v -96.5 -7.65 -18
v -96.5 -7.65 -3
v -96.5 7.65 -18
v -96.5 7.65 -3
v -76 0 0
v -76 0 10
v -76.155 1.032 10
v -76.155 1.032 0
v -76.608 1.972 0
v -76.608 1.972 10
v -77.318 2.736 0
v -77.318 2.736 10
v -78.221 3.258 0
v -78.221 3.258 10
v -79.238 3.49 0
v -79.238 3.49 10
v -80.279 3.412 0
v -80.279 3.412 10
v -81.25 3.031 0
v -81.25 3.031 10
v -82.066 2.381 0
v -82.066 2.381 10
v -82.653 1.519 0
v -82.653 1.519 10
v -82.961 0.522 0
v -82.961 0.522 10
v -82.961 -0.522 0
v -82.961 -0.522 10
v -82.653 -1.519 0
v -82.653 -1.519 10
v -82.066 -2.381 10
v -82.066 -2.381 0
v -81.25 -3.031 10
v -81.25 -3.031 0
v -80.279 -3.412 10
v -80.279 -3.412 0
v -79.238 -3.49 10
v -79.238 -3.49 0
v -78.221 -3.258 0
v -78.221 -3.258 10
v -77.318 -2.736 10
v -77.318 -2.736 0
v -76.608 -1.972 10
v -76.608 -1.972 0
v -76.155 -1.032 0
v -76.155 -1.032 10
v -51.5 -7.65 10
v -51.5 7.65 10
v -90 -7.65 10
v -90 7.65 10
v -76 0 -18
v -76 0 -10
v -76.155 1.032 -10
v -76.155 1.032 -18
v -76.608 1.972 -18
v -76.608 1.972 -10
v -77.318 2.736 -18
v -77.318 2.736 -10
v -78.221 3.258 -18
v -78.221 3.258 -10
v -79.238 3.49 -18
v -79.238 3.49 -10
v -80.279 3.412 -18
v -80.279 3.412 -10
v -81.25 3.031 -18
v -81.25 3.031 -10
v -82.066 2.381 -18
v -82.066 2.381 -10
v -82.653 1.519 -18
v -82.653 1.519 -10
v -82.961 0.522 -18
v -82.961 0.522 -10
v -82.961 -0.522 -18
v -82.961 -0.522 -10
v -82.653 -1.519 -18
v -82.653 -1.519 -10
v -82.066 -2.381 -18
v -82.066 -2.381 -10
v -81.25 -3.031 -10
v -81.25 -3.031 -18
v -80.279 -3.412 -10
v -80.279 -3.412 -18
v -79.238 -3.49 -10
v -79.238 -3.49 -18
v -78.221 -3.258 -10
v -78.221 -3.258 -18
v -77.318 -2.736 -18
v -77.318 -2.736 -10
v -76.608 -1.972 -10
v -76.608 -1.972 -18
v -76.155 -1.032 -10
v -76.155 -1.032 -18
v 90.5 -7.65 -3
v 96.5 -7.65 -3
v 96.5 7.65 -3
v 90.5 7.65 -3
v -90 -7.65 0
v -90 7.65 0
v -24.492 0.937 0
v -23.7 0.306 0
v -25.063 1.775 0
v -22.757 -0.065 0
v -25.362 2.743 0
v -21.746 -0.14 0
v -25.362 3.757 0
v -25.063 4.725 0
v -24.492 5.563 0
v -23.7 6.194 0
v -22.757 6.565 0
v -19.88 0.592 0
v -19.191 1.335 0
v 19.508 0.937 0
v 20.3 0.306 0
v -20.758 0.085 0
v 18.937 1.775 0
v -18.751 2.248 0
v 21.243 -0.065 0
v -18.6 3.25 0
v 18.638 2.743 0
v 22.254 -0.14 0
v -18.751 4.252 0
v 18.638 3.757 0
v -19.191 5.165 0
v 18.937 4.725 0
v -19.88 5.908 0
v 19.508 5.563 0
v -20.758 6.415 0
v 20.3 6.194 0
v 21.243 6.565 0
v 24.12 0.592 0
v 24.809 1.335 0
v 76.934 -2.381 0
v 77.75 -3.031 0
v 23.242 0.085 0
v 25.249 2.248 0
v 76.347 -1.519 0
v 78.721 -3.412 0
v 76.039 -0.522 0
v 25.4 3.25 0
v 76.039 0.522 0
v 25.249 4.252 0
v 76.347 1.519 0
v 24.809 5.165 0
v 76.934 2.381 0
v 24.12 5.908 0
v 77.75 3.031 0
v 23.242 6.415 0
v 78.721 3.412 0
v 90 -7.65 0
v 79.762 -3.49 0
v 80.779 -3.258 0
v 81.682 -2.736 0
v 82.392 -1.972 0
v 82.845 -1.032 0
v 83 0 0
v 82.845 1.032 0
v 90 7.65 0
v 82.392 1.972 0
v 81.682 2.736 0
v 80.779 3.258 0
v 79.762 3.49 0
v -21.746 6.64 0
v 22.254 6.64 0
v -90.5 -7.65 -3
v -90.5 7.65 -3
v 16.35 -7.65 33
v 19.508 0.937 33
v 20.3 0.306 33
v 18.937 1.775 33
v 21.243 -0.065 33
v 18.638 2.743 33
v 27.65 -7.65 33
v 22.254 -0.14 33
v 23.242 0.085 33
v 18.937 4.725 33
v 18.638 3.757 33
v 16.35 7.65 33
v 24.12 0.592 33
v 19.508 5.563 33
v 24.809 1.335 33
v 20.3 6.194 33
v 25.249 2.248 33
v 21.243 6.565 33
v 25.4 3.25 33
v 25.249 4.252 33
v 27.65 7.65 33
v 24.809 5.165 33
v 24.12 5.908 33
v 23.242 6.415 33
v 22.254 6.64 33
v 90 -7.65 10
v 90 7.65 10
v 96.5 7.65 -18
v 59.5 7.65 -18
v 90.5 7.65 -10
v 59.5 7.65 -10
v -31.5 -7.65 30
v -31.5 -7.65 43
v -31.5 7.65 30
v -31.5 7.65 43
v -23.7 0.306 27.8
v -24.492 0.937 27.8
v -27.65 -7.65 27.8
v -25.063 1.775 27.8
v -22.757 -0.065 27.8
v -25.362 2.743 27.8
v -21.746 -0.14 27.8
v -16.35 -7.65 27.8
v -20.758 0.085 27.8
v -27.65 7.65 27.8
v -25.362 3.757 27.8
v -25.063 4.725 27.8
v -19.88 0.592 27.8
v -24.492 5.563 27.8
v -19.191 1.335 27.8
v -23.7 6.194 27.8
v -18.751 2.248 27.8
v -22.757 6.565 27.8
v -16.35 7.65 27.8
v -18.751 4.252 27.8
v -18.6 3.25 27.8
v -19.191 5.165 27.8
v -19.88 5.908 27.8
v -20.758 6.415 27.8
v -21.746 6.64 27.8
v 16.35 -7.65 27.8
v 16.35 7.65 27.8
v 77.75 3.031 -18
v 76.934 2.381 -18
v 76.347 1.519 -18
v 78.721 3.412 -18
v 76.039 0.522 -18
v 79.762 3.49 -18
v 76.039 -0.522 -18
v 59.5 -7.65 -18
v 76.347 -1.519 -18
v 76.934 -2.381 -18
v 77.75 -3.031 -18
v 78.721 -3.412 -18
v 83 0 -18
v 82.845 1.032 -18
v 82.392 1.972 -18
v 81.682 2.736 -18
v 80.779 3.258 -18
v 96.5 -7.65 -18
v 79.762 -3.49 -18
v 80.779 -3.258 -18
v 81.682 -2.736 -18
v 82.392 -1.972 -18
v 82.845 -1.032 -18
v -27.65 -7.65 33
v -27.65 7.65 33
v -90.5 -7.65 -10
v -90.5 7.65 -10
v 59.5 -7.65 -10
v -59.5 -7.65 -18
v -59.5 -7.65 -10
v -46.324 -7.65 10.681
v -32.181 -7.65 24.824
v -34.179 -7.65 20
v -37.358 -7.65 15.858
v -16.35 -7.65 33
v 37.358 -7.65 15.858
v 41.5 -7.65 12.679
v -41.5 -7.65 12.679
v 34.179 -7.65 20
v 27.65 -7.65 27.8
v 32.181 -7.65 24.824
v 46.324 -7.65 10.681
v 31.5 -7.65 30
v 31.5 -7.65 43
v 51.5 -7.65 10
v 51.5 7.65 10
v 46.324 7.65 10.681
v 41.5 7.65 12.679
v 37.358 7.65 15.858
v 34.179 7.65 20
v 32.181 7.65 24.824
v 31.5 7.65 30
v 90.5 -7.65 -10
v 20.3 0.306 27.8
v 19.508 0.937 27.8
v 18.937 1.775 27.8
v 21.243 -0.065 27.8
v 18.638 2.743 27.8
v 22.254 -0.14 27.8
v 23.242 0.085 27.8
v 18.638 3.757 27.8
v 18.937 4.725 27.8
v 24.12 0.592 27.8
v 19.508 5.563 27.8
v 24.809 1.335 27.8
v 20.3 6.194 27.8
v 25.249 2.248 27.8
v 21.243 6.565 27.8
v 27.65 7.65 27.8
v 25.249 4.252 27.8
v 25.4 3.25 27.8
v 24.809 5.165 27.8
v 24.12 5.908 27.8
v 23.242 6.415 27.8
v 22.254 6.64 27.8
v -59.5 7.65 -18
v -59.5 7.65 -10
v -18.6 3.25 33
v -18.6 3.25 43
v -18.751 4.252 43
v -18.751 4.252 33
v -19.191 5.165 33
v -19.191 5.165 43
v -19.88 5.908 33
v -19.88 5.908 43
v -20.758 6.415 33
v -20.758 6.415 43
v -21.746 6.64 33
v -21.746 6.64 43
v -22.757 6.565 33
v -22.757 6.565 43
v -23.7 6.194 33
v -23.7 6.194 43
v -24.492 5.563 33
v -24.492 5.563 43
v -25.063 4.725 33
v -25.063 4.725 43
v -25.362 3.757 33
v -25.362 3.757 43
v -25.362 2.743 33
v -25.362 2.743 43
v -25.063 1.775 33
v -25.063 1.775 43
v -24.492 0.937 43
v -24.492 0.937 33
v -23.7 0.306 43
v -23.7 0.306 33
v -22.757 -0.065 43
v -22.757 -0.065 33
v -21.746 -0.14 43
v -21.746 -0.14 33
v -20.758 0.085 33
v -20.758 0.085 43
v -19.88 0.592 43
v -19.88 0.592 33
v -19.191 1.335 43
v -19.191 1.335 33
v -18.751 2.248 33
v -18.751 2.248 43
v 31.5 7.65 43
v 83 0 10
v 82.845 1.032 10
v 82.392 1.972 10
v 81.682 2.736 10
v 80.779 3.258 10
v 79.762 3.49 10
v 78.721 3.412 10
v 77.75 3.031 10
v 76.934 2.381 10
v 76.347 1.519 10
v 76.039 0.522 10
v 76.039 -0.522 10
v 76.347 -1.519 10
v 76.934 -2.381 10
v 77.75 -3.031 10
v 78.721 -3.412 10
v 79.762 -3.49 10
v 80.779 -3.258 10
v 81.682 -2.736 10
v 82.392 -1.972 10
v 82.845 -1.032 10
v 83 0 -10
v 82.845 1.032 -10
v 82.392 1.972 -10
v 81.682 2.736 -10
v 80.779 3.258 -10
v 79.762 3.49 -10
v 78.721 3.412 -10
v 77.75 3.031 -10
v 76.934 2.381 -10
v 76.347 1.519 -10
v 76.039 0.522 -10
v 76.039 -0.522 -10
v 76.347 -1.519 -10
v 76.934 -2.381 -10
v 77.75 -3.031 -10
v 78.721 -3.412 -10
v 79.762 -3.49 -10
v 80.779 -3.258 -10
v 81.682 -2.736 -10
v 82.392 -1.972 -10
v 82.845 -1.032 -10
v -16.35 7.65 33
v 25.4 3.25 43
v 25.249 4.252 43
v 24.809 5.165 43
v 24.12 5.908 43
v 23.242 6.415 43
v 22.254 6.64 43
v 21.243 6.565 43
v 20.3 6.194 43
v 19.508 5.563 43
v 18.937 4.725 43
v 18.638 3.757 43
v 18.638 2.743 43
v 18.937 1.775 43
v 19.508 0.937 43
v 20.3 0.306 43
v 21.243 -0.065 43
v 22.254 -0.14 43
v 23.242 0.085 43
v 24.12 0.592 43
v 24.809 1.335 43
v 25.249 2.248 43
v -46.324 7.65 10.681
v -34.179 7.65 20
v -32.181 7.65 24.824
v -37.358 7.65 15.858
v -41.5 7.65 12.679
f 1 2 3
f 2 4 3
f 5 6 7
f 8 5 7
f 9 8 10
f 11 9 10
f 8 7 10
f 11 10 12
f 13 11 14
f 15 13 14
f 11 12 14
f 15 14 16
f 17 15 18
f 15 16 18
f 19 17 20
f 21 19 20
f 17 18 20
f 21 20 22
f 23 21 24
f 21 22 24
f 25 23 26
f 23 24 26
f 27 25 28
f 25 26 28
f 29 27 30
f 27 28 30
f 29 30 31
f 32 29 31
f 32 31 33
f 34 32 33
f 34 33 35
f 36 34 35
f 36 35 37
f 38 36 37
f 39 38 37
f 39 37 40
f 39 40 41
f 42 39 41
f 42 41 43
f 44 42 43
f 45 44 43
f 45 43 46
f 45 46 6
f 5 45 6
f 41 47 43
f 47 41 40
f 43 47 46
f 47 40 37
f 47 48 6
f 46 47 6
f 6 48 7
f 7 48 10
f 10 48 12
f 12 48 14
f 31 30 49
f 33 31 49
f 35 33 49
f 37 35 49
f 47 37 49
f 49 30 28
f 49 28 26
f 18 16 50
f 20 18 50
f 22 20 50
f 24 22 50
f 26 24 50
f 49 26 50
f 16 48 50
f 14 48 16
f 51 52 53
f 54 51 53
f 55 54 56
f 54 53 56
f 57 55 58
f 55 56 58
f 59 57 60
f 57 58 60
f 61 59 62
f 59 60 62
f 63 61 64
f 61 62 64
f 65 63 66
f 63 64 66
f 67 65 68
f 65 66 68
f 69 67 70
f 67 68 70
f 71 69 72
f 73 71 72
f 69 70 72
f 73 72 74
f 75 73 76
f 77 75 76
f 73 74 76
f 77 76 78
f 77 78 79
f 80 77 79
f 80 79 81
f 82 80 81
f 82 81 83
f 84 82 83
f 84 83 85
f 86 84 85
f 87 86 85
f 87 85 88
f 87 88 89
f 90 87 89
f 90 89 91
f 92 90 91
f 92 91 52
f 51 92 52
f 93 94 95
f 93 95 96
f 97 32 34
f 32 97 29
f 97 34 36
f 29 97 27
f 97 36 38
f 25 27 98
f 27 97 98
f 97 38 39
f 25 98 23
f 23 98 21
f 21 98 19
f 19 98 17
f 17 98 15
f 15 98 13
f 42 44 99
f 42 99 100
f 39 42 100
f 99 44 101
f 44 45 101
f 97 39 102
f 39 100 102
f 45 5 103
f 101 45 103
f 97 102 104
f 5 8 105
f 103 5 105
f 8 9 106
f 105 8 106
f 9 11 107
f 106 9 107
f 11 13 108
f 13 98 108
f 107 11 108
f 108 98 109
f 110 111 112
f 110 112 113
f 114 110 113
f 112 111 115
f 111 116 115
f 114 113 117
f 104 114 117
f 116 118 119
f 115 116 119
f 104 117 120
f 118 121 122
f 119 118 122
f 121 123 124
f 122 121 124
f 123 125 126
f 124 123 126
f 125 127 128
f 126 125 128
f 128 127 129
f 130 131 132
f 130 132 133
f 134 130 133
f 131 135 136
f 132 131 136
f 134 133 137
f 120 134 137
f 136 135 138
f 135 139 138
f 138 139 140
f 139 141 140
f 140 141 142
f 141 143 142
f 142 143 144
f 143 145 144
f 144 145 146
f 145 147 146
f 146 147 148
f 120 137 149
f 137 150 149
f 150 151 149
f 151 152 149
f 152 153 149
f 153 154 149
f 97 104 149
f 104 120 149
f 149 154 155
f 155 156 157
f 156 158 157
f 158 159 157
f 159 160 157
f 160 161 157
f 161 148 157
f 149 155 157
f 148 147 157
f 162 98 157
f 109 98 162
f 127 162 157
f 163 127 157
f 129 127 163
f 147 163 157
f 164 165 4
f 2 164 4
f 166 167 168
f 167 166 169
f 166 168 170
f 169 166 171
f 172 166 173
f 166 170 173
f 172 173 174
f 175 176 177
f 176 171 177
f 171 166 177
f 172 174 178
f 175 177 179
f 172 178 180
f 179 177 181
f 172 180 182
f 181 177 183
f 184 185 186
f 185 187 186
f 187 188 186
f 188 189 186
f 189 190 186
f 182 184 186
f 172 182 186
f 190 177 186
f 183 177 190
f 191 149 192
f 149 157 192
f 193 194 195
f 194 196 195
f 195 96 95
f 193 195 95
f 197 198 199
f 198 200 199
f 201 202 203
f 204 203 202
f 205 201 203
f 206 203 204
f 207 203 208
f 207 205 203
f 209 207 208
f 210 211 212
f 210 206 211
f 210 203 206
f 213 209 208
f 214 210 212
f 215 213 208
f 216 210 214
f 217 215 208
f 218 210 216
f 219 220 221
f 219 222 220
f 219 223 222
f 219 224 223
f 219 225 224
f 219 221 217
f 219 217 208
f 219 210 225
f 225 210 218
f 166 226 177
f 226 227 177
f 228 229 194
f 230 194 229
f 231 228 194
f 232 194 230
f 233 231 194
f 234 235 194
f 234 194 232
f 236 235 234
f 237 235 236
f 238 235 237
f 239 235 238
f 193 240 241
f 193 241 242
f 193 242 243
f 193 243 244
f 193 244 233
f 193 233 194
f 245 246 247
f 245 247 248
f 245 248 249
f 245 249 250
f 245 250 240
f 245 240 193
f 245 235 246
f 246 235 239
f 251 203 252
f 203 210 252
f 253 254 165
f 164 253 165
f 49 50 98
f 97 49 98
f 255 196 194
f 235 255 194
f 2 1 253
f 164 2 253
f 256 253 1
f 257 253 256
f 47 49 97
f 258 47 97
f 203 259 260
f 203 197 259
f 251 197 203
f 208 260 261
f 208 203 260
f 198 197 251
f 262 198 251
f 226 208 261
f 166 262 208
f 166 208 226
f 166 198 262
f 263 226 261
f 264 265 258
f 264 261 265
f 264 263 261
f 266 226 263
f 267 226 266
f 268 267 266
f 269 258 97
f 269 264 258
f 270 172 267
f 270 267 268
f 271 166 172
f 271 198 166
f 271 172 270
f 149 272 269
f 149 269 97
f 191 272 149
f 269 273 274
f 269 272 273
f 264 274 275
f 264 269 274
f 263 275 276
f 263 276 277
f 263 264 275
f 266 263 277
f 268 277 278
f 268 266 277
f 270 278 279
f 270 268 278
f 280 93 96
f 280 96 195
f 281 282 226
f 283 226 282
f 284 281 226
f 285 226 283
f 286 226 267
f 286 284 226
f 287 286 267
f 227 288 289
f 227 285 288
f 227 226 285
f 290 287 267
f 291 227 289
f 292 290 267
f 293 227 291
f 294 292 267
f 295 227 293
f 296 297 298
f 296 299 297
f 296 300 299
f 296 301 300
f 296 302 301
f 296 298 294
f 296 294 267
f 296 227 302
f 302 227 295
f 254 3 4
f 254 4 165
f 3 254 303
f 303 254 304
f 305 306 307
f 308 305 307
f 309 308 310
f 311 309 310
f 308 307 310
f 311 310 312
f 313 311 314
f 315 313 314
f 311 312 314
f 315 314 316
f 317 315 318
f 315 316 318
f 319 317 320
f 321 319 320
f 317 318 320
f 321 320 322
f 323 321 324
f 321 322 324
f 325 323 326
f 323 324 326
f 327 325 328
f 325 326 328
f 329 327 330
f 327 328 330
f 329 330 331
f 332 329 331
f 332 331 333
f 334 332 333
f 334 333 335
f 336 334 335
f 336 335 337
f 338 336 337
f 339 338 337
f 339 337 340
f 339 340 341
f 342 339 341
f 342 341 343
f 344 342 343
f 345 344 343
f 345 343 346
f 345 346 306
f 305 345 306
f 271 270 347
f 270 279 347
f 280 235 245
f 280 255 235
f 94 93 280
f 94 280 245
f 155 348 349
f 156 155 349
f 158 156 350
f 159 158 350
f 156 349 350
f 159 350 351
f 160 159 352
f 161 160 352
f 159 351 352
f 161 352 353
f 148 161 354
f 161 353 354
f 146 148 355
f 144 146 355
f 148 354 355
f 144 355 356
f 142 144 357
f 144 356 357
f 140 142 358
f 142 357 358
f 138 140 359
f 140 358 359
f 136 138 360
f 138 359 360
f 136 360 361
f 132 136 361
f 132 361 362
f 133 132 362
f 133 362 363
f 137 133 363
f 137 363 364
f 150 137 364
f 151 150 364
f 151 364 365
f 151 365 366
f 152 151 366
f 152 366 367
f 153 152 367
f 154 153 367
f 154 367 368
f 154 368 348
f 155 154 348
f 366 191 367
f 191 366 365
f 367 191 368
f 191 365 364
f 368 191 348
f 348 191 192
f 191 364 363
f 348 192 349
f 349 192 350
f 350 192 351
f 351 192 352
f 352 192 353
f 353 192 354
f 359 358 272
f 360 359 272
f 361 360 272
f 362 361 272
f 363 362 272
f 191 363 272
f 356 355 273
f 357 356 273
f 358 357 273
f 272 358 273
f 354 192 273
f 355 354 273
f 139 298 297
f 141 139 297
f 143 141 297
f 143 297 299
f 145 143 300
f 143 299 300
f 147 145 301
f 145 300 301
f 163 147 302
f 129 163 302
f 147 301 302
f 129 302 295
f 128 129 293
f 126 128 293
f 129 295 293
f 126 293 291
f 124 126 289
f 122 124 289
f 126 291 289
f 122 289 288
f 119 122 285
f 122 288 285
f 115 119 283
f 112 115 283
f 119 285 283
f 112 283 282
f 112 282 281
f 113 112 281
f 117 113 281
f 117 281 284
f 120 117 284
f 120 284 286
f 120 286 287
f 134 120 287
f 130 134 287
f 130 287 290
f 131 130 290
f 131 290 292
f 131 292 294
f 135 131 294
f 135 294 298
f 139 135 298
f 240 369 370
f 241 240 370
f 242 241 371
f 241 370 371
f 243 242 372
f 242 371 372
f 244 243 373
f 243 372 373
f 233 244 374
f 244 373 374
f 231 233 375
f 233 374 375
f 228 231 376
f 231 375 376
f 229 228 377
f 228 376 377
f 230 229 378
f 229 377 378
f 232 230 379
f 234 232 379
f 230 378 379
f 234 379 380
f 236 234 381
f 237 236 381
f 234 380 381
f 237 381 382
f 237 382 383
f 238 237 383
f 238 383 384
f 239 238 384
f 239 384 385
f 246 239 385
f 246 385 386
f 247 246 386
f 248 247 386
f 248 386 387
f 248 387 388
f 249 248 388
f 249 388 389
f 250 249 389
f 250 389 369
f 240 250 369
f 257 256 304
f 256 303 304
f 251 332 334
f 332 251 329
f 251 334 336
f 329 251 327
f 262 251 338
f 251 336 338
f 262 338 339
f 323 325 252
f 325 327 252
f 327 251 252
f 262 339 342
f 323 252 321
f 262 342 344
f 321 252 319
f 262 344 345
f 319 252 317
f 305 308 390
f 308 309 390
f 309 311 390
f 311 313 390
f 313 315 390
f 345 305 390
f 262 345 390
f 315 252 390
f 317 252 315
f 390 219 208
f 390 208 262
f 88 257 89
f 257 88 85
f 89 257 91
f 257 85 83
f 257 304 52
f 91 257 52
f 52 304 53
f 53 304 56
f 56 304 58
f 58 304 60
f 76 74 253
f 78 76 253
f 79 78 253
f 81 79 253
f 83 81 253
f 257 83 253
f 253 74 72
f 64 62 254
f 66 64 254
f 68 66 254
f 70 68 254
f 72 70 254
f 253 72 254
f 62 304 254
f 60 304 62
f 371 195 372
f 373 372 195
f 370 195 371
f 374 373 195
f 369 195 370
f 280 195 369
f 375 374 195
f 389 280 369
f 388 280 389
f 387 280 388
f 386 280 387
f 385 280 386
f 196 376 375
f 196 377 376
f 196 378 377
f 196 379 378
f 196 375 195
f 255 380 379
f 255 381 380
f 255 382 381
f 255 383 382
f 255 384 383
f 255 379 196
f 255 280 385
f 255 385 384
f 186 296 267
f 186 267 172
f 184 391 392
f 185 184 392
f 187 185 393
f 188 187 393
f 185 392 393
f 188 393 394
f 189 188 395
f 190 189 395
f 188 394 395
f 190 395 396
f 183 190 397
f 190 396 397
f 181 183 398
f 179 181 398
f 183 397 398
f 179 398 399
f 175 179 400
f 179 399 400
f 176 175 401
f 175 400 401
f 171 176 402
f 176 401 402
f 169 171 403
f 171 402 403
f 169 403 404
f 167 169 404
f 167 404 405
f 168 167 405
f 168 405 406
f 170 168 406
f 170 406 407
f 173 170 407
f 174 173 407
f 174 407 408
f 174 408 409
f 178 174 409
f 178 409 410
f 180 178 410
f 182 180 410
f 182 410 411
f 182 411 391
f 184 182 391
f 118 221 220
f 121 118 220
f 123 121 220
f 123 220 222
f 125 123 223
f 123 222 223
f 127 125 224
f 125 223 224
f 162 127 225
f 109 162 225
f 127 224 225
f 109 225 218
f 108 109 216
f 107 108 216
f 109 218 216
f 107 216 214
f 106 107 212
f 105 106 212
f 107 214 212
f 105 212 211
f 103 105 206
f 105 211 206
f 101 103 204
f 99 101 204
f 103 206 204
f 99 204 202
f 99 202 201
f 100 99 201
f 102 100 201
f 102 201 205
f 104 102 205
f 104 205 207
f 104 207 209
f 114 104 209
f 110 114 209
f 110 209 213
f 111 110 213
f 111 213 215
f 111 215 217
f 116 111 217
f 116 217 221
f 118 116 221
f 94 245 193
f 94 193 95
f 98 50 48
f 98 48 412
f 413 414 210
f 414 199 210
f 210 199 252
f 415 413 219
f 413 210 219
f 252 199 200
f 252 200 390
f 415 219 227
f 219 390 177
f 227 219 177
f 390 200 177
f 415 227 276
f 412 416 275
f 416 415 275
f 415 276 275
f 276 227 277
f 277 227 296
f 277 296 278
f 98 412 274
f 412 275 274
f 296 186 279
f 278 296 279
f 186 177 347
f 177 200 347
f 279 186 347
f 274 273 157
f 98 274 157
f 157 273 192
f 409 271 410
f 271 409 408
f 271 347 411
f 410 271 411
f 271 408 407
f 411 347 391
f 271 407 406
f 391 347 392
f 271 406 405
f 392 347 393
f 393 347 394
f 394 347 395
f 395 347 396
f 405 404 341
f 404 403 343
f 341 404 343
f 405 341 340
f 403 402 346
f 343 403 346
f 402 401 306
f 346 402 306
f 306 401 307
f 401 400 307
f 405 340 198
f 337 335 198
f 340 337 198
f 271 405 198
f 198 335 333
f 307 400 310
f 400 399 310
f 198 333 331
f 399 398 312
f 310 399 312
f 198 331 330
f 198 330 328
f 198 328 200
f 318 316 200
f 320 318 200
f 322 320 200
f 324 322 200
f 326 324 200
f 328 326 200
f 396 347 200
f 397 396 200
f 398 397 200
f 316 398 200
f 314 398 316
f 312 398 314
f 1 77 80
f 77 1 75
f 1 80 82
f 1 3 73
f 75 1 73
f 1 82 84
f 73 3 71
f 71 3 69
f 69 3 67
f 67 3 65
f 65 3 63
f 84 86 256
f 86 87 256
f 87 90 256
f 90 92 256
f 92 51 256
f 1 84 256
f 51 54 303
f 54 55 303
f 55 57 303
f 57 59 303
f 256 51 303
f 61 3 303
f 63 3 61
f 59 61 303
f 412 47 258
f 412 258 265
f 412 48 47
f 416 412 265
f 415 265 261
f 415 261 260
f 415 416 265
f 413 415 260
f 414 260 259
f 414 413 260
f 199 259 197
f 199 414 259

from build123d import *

# Parameters (mm, degrees)
F0_W     = 11.3
F0_H     = 5.2
F1_DEPTH = 7.65
F2_R     = 3.4
F3_DEPTH = 43
F4_R     = 3.5
F5_DEPTH = 28
F6_R     = 20


with BuildPart() as f1:
    # F0 (on Front) → F1 (new body, symmetric)
    with BuildSketch(Plane.XZ):
        Polygon((-90, 0), (-31.5, 0), (31.5, 0), (90, 0), (90, 10), (31.5, 10), (31.5, 43), (-31.5, 43), (-31.5, 10), (-90, 10), align=None)
        with Locations((-22, 30.4)):
            Rectangle(F0_W, F0_H, mode=Mode.SUBTRACT)
        with Locations((22, 30.4)):
            Rectangle(F0_W, F0_H, mode=Mode.SUBTRACT)
        Polygon((-90.5, -3), (-96.5, -3), (-96.5, -18), (-59.5, -18), (-59.5, -10), (-90.5, -10), align=None)
        Polygon((59.5, -18), (96.5, -18), (96.5, -3), (90.5, -3), (90.5, -10), (59.5, -10), align=None)
    extrude(amount=F1_DEPTH, both=True)

    # F2 (on face) → F3 (cut, through all)
    with BuildSketch(Plane.XY.offset(43)):
        with Locations((-22, 3.25)):
            Circle(F2_R)
        with Locations((22, 3.25)):
            Circle(F2_R)
    extrude(amount=-F3_DEPTH, mode=Mode.SUBTRACT)

    # F4 (on face) → F5 (cut, through all)
    with BuildSketch(Plane.XY.offset(10)):
        with Locations((-79.5, 0)):
            Circle(F4_R)
        with Locations((79.5, 0)):
            Circle(F4_R)
    extrude(amount=-F5_DEPTH, mode=Mode.SUBTRACT)

    # F6
    f6_edges = [f1.edges().sort_by_distance(p)[0] for p in [
        (31.5, 0, 10),
        (-31.5, 0, 10),
    ]]
    fillet(f6_edges, radius=F6_R)


solid = f1.part
